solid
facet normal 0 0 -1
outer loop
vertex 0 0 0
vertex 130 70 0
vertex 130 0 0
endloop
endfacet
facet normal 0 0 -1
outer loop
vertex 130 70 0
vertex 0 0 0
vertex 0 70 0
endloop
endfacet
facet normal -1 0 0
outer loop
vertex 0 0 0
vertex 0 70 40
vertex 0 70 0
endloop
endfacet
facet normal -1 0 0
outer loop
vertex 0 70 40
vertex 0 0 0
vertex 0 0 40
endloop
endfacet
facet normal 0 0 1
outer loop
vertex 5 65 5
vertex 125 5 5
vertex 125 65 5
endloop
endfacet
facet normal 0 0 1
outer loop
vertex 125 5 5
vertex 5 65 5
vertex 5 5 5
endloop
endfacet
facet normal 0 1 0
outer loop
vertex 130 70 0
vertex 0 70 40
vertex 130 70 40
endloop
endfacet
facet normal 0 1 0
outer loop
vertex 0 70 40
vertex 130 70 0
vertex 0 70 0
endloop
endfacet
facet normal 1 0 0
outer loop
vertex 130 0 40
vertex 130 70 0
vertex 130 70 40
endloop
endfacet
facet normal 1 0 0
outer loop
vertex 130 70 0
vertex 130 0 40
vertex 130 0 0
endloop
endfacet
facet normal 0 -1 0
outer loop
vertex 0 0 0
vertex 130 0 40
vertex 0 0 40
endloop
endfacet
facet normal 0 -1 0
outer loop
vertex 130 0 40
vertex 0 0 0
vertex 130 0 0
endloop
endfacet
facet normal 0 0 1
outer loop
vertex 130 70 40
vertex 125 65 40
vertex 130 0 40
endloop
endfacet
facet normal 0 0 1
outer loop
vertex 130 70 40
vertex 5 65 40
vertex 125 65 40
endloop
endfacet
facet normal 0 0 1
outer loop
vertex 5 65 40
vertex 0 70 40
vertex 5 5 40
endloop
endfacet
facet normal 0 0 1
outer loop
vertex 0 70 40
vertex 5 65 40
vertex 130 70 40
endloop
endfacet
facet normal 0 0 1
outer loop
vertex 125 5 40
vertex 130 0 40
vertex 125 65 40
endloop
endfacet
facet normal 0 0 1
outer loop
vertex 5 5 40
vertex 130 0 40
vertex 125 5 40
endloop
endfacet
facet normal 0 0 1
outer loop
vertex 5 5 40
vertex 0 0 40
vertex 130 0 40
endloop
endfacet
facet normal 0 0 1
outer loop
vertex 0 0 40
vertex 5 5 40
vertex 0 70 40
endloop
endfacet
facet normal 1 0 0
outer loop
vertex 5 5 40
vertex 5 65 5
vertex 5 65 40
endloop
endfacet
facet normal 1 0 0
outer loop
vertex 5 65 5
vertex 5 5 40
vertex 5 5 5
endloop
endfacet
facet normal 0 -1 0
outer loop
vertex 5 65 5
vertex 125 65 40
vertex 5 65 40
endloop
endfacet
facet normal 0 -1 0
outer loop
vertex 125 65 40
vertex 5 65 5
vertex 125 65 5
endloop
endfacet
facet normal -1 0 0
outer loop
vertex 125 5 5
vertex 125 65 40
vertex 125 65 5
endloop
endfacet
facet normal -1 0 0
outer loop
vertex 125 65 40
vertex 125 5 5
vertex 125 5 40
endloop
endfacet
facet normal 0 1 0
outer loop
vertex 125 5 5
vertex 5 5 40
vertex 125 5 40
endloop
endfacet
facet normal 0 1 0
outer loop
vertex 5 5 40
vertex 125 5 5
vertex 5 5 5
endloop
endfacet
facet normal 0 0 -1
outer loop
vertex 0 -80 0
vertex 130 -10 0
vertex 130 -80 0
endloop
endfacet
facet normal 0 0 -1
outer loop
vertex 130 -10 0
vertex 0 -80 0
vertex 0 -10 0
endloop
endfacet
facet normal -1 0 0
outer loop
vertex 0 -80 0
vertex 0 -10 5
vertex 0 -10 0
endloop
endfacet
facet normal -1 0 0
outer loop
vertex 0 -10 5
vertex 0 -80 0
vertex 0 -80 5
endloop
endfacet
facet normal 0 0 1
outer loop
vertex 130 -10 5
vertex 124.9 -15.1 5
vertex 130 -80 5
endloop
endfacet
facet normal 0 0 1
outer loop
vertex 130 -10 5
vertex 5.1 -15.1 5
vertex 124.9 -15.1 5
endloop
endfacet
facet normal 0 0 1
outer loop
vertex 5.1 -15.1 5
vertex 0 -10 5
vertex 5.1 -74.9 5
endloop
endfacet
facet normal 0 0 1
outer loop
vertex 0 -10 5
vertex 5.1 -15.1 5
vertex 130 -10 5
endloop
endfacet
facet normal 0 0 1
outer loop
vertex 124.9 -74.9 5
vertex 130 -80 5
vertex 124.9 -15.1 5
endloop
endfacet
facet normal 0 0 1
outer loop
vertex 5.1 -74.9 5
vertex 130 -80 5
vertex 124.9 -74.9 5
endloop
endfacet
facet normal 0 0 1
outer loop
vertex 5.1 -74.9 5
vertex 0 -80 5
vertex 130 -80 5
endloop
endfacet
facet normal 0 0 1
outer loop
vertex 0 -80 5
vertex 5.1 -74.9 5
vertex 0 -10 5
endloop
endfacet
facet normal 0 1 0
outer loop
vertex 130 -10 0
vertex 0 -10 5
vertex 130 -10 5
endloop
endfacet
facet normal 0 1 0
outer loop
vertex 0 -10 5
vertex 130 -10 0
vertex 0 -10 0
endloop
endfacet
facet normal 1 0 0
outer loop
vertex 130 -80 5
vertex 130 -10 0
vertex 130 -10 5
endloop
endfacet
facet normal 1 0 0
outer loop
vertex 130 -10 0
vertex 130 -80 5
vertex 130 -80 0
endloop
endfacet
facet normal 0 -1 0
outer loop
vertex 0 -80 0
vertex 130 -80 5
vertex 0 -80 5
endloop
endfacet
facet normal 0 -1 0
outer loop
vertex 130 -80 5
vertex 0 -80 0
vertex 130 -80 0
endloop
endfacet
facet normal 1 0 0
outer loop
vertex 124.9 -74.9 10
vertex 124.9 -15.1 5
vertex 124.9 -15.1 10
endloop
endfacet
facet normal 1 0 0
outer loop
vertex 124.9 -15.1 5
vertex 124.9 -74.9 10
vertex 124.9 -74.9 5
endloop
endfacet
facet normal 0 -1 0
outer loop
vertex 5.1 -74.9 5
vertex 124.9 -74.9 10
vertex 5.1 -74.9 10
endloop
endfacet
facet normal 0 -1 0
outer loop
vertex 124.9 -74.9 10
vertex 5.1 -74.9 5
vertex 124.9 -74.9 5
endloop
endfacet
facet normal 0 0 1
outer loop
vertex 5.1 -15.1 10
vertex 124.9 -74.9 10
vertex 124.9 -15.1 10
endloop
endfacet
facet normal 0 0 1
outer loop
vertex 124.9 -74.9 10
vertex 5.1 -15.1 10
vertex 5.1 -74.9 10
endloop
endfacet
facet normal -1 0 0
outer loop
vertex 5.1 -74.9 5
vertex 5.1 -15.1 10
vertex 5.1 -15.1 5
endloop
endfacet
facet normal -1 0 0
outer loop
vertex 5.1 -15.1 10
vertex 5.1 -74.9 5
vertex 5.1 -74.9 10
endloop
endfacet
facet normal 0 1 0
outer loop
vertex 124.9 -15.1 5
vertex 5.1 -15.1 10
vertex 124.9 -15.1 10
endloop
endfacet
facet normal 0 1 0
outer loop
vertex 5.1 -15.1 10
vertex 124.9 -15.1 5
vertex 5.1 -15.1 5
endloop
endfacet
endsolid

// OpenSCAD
clearance = 0.1;

module outer_rectangle() {
	square([130, 70]);
}

module inner_rectangle() {
	offset(-5) outer_rectangle();
}

module box() {
	union() {
		linear_extrude(5) outer_rectangle();
		translate([0, 0, 5])
			linear_extrude(35)
				difference() {
					outer_rectangle();
					inner_rectangle();
				}
	}
}

module lid() {
	difference() {
		union() {
			linear_extrude(5) outer_rectangle();
			translate([0, 0, 5])
				linear_extrude(5)
					offset(-clearance) inner_rectangle();
		}
		translate([115, 30])
			mirror([1, 0, 0]) text("Storytelling Dice");
	}
}

box();
translate([0, -80]) lid();
